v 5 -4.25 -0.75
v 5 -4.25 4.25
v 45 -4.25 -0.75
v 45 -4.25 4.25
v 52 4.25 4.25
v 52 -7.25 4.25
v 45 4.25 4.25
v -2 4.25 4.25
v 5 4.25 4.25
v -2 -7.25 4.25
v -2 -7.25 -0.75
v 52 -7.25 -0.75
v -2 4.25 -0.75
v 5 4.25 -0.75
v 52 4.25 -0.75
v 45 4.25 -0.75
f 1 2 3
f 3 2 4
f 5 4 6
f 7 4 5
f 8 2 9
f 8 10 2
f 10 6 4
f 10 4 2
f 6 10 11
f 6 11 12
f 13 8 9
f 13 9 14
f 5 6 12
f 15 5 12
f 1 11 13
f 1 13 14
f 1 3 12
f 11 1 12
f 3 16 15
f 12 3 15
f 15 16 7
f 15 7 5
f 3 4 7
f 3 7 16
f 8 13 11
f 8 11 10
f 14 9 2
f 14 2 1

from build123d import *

# Parameters (mm, degrees)
SKETCH1_W           = 8.5
SKETCH1_H           = 8.5
BOSS_EXTRUDE1_DEPTH = 5
SKETCH2_W           = 8.5
SKETCH2_H           = 8.5
BOSS_EXTRUDE2_DEPTH = 2
SKETCH3_R           = 1.5
CUT_EXTRUDE1_DEPTH  = 2
SKETCH4_W           = 54
SKETCH4_H           = 8.5
BOSS_EXTRUDE3_DEPTH = 3
SKETCH5_W           = 7
SKETCH5_H           = 8.5
BOSS_EXTRUDE4_DEPTH = 8.5
SKETCH8_R           = 1.5
BOSS_EXTRUDE5_DEPTH = 2.5
SKETCH9_R           = 1.5
BOSS_EXTRUDE6_DEPTH = 2.5
SKETCH10_W          = 8.5
SKETCH10_H          = 8.5
BOSS_EXTRUDE7_DEPTH = 1
CUT_EXTRUDE4_DEPTH  = 0.5
CUT_EXTRUDE5_DEPTH  = 0.5
SKETCH14_W          = 8.5
SKETCH14_H          = 8.5
BOSS_EXTRUDE8_DEPTH = 8
SKETCH15_W          = 8.5
SKETCH15_H          = 8.5
CUT_EXTRUDE6_DEPTH  = 1
SKETCH16_W          = 54
SKETCH16_H          = 3.5
CUT_EXTRUDE7_DEPTH  = 15
SKETCH17_W          = 5
SKETCH17_H          = 8.5
BOSS_EXTRUDE9_DEPTH = 7


with BuildPart() as part:
    # Sketch1 → Boss-Extrude1 (new body)
    with BuildSketch(Plane(origin=(0, 0, 0), x_dir=(0, 0, -1), z_dir=(1, 0, 0))):
        Rectangle(SKETCH1_W, SKETCH1_H)
        Polygon((1.705, 2.953146627), (-1.705, 2.953146627), (-3.41, 0), (-1.705, -2.953146627), (1.705, -2.953146627), (3.41, 0), align=None, mode=Mode.SUBTRACT)
    extrude(amount=BOSS_EXTRUDE1_DEPTH)

    # Sketch2 → Boss-Extrude2 (add)
    with BuildSketch(Plane.ZY):
        Rectangle(SKETCH2_W, SKETCH2_H)
    extrude(amount=BOSS_EXTRUDE2_DEPTH)

    # Sketch3 → Cut-Extrude1 (cut)
    with BuildSketch(Plane(origin=(0, 0, 0), x_dir=(0, 0, -1), z_dir=(1, 0, 0))):
        Circle(SKETCH3_R)
    extrude(amount=-CUT_EXTRUDE1_DEPTH, mode=Mode.SUBTRACT)

    # Sketch4 → Boss-Extrude3 (add)
    with BuildSketch(Plane.XZ.offset(4.25)):
        with Locations((25, 0)):
            Rectangle(SKETCH4_W, SKETCH4_H)
    extrude(amount=BOSS_EXTRUDE3_DEPTH)

    # Sketch5 → Boss-Extrude4 (add)
    with BuildSketch(Plane(origin=(0, -4.25, 0), x_dir=(1, 0, 0), z_dir=(0, 1, 0))):
        with Locations((48.5, 0)):
            Rectangle(SKETCH5_W, SKETCH5_H)
    extrude(amount=BOSS_EXTRUDE4_DEPTH)

    # Sketch8 → Boss-Extrude5 (add)
    with BuildSketch(Plane(origin=(0, 0, 0), x_dir=(0, 0, -1), z_dir=(1, 0, 0))):
        Polygon((-1.705, 2.953146627), (-3.41, 0), (-1.705, -2.953146627), (1.705, -2.953146627), (3.41, 0), (1.705, 2.953146627), align=None)
        Circle(SKETCH8_R, mode=Mode.SUBTRACT)
    extrude(amount=BOSS_EXTRUDE5_DEPTH)

    # Sketch9 → Boss-Extrude6 (add)
    with BuildSketch(Plane.ZY.offset(-50)):
        Polygon((3.41, 0), (1.705, 2.953146627), (-1.705, 2.953146627), (-3.41, 0), (-1.705, -2.953146627), (1.705, -2.953146627), align=None)
        with Locations(Location((0, 0, 0), (0, 0, 180))):
            Circle(SKETCH9_R, mode=Mode.SUBTRACT)
    extrude(amount=BOSS_EXTRUDE6_DEPTH)

    # Sketch10 → Boss-Extrude7 (add)
    with BuildSketch(Plane(origin=(5, 0, 0), x_dir=(0, 0, -1), z_dir=(1, 0, 0))):
        Rectangle(SKETCH10_W, SKETCH10_H)
        Polygon((3.41, 0), (1.705, 2.953146627), (-1.705, 2.953146627), (-3.41, 0), (-1.705, -2.953146627), (1.705, -2.953146627), align=None, mode=Mode.SUBTRACT)
    extrude(amount=BOSS_EXTRUDE7_DEPTH)

    # Sketch12 → Cut-Extrude4 (cut)
    with BuildSketch(Plane(origin=(2.5, 0, 0), x_dir=(0, 0, -1), z_dir=(1, 0, 0))):
        Polygon((1.705, -2.953146627), (3.41, 0), (1.705, 2.953146627), (-1.705, 2.953146627), (-3.41, 0), (-1.705, -2.953146627), align=None)
    extrude(amount=-CUT_EXTRUDE4_DEPTH, mode=Mode.SUBTRACT)

    # Sketch13 → Cut-Extrude5 (cut)
    with BuildSketch(Plane.ZY.offset(-47.5)):
        Polygon((1.705, 2.953146627), (-1.705, 2.953146627), (-3.41, 0), (-1.705, -2.953146627), (1.705, -2.953146627), (3.41, 0), align=None)
    extrude(amount=-CUT_EXTRUDE5_DEPTH, mode=Mode.SUBTRACT)

    # Sketch14 → Boss-Extrude8 (add)
    with BuildSketch(Plane(origin=(6, 0, 0), x_dir=(0, 0, -1), z_dir=(1, 0, 0))):
        Rectangle(SKETCH14_W, SKETCH14_H)
    extrude(amount=-BOSS_EXTRUDE8_DEPTH)

    # Sketch15 → Cut-Extrude6 (cut)
    with BuildSketch(Plane(origin=(6, 0, 0), x_dir=(0, 0, -1), z_dir=(1, 0, 0))):
        Rectangle(SKETCH15_W, SKETCH15_H)
    extrude(amount=-CUT_EXTRUDE6_DEPTH, mode=Mode.SUBTRACT)

    # Sketch16 → Cut-Extrude7 (cut)
    with BuildSketch(Plane(origin=(0, 4.25, 0), x_dir=(1, 0, 0), z_dir=(0, 1, 0))):
        with Locations((25, 2.5)):
            Rectangle(SKETCH16_W, SKETCH16_H)
    extrude(amount=-CUT_EXTRUDE7_DEPTH, mode=Mode.SUBTRACT)

    # Sketch17 → Boss-Extrude9 (add)
    with BuildSketch(Plane.ZY.offset(-45)):
        with Locations((1.75, 0)):
            Rectangle(SKETCH17_W, SKETCH17_H)
    extrude(amount=-BOSS_EXTRUDE9_DEPTH)


solid = part.part
